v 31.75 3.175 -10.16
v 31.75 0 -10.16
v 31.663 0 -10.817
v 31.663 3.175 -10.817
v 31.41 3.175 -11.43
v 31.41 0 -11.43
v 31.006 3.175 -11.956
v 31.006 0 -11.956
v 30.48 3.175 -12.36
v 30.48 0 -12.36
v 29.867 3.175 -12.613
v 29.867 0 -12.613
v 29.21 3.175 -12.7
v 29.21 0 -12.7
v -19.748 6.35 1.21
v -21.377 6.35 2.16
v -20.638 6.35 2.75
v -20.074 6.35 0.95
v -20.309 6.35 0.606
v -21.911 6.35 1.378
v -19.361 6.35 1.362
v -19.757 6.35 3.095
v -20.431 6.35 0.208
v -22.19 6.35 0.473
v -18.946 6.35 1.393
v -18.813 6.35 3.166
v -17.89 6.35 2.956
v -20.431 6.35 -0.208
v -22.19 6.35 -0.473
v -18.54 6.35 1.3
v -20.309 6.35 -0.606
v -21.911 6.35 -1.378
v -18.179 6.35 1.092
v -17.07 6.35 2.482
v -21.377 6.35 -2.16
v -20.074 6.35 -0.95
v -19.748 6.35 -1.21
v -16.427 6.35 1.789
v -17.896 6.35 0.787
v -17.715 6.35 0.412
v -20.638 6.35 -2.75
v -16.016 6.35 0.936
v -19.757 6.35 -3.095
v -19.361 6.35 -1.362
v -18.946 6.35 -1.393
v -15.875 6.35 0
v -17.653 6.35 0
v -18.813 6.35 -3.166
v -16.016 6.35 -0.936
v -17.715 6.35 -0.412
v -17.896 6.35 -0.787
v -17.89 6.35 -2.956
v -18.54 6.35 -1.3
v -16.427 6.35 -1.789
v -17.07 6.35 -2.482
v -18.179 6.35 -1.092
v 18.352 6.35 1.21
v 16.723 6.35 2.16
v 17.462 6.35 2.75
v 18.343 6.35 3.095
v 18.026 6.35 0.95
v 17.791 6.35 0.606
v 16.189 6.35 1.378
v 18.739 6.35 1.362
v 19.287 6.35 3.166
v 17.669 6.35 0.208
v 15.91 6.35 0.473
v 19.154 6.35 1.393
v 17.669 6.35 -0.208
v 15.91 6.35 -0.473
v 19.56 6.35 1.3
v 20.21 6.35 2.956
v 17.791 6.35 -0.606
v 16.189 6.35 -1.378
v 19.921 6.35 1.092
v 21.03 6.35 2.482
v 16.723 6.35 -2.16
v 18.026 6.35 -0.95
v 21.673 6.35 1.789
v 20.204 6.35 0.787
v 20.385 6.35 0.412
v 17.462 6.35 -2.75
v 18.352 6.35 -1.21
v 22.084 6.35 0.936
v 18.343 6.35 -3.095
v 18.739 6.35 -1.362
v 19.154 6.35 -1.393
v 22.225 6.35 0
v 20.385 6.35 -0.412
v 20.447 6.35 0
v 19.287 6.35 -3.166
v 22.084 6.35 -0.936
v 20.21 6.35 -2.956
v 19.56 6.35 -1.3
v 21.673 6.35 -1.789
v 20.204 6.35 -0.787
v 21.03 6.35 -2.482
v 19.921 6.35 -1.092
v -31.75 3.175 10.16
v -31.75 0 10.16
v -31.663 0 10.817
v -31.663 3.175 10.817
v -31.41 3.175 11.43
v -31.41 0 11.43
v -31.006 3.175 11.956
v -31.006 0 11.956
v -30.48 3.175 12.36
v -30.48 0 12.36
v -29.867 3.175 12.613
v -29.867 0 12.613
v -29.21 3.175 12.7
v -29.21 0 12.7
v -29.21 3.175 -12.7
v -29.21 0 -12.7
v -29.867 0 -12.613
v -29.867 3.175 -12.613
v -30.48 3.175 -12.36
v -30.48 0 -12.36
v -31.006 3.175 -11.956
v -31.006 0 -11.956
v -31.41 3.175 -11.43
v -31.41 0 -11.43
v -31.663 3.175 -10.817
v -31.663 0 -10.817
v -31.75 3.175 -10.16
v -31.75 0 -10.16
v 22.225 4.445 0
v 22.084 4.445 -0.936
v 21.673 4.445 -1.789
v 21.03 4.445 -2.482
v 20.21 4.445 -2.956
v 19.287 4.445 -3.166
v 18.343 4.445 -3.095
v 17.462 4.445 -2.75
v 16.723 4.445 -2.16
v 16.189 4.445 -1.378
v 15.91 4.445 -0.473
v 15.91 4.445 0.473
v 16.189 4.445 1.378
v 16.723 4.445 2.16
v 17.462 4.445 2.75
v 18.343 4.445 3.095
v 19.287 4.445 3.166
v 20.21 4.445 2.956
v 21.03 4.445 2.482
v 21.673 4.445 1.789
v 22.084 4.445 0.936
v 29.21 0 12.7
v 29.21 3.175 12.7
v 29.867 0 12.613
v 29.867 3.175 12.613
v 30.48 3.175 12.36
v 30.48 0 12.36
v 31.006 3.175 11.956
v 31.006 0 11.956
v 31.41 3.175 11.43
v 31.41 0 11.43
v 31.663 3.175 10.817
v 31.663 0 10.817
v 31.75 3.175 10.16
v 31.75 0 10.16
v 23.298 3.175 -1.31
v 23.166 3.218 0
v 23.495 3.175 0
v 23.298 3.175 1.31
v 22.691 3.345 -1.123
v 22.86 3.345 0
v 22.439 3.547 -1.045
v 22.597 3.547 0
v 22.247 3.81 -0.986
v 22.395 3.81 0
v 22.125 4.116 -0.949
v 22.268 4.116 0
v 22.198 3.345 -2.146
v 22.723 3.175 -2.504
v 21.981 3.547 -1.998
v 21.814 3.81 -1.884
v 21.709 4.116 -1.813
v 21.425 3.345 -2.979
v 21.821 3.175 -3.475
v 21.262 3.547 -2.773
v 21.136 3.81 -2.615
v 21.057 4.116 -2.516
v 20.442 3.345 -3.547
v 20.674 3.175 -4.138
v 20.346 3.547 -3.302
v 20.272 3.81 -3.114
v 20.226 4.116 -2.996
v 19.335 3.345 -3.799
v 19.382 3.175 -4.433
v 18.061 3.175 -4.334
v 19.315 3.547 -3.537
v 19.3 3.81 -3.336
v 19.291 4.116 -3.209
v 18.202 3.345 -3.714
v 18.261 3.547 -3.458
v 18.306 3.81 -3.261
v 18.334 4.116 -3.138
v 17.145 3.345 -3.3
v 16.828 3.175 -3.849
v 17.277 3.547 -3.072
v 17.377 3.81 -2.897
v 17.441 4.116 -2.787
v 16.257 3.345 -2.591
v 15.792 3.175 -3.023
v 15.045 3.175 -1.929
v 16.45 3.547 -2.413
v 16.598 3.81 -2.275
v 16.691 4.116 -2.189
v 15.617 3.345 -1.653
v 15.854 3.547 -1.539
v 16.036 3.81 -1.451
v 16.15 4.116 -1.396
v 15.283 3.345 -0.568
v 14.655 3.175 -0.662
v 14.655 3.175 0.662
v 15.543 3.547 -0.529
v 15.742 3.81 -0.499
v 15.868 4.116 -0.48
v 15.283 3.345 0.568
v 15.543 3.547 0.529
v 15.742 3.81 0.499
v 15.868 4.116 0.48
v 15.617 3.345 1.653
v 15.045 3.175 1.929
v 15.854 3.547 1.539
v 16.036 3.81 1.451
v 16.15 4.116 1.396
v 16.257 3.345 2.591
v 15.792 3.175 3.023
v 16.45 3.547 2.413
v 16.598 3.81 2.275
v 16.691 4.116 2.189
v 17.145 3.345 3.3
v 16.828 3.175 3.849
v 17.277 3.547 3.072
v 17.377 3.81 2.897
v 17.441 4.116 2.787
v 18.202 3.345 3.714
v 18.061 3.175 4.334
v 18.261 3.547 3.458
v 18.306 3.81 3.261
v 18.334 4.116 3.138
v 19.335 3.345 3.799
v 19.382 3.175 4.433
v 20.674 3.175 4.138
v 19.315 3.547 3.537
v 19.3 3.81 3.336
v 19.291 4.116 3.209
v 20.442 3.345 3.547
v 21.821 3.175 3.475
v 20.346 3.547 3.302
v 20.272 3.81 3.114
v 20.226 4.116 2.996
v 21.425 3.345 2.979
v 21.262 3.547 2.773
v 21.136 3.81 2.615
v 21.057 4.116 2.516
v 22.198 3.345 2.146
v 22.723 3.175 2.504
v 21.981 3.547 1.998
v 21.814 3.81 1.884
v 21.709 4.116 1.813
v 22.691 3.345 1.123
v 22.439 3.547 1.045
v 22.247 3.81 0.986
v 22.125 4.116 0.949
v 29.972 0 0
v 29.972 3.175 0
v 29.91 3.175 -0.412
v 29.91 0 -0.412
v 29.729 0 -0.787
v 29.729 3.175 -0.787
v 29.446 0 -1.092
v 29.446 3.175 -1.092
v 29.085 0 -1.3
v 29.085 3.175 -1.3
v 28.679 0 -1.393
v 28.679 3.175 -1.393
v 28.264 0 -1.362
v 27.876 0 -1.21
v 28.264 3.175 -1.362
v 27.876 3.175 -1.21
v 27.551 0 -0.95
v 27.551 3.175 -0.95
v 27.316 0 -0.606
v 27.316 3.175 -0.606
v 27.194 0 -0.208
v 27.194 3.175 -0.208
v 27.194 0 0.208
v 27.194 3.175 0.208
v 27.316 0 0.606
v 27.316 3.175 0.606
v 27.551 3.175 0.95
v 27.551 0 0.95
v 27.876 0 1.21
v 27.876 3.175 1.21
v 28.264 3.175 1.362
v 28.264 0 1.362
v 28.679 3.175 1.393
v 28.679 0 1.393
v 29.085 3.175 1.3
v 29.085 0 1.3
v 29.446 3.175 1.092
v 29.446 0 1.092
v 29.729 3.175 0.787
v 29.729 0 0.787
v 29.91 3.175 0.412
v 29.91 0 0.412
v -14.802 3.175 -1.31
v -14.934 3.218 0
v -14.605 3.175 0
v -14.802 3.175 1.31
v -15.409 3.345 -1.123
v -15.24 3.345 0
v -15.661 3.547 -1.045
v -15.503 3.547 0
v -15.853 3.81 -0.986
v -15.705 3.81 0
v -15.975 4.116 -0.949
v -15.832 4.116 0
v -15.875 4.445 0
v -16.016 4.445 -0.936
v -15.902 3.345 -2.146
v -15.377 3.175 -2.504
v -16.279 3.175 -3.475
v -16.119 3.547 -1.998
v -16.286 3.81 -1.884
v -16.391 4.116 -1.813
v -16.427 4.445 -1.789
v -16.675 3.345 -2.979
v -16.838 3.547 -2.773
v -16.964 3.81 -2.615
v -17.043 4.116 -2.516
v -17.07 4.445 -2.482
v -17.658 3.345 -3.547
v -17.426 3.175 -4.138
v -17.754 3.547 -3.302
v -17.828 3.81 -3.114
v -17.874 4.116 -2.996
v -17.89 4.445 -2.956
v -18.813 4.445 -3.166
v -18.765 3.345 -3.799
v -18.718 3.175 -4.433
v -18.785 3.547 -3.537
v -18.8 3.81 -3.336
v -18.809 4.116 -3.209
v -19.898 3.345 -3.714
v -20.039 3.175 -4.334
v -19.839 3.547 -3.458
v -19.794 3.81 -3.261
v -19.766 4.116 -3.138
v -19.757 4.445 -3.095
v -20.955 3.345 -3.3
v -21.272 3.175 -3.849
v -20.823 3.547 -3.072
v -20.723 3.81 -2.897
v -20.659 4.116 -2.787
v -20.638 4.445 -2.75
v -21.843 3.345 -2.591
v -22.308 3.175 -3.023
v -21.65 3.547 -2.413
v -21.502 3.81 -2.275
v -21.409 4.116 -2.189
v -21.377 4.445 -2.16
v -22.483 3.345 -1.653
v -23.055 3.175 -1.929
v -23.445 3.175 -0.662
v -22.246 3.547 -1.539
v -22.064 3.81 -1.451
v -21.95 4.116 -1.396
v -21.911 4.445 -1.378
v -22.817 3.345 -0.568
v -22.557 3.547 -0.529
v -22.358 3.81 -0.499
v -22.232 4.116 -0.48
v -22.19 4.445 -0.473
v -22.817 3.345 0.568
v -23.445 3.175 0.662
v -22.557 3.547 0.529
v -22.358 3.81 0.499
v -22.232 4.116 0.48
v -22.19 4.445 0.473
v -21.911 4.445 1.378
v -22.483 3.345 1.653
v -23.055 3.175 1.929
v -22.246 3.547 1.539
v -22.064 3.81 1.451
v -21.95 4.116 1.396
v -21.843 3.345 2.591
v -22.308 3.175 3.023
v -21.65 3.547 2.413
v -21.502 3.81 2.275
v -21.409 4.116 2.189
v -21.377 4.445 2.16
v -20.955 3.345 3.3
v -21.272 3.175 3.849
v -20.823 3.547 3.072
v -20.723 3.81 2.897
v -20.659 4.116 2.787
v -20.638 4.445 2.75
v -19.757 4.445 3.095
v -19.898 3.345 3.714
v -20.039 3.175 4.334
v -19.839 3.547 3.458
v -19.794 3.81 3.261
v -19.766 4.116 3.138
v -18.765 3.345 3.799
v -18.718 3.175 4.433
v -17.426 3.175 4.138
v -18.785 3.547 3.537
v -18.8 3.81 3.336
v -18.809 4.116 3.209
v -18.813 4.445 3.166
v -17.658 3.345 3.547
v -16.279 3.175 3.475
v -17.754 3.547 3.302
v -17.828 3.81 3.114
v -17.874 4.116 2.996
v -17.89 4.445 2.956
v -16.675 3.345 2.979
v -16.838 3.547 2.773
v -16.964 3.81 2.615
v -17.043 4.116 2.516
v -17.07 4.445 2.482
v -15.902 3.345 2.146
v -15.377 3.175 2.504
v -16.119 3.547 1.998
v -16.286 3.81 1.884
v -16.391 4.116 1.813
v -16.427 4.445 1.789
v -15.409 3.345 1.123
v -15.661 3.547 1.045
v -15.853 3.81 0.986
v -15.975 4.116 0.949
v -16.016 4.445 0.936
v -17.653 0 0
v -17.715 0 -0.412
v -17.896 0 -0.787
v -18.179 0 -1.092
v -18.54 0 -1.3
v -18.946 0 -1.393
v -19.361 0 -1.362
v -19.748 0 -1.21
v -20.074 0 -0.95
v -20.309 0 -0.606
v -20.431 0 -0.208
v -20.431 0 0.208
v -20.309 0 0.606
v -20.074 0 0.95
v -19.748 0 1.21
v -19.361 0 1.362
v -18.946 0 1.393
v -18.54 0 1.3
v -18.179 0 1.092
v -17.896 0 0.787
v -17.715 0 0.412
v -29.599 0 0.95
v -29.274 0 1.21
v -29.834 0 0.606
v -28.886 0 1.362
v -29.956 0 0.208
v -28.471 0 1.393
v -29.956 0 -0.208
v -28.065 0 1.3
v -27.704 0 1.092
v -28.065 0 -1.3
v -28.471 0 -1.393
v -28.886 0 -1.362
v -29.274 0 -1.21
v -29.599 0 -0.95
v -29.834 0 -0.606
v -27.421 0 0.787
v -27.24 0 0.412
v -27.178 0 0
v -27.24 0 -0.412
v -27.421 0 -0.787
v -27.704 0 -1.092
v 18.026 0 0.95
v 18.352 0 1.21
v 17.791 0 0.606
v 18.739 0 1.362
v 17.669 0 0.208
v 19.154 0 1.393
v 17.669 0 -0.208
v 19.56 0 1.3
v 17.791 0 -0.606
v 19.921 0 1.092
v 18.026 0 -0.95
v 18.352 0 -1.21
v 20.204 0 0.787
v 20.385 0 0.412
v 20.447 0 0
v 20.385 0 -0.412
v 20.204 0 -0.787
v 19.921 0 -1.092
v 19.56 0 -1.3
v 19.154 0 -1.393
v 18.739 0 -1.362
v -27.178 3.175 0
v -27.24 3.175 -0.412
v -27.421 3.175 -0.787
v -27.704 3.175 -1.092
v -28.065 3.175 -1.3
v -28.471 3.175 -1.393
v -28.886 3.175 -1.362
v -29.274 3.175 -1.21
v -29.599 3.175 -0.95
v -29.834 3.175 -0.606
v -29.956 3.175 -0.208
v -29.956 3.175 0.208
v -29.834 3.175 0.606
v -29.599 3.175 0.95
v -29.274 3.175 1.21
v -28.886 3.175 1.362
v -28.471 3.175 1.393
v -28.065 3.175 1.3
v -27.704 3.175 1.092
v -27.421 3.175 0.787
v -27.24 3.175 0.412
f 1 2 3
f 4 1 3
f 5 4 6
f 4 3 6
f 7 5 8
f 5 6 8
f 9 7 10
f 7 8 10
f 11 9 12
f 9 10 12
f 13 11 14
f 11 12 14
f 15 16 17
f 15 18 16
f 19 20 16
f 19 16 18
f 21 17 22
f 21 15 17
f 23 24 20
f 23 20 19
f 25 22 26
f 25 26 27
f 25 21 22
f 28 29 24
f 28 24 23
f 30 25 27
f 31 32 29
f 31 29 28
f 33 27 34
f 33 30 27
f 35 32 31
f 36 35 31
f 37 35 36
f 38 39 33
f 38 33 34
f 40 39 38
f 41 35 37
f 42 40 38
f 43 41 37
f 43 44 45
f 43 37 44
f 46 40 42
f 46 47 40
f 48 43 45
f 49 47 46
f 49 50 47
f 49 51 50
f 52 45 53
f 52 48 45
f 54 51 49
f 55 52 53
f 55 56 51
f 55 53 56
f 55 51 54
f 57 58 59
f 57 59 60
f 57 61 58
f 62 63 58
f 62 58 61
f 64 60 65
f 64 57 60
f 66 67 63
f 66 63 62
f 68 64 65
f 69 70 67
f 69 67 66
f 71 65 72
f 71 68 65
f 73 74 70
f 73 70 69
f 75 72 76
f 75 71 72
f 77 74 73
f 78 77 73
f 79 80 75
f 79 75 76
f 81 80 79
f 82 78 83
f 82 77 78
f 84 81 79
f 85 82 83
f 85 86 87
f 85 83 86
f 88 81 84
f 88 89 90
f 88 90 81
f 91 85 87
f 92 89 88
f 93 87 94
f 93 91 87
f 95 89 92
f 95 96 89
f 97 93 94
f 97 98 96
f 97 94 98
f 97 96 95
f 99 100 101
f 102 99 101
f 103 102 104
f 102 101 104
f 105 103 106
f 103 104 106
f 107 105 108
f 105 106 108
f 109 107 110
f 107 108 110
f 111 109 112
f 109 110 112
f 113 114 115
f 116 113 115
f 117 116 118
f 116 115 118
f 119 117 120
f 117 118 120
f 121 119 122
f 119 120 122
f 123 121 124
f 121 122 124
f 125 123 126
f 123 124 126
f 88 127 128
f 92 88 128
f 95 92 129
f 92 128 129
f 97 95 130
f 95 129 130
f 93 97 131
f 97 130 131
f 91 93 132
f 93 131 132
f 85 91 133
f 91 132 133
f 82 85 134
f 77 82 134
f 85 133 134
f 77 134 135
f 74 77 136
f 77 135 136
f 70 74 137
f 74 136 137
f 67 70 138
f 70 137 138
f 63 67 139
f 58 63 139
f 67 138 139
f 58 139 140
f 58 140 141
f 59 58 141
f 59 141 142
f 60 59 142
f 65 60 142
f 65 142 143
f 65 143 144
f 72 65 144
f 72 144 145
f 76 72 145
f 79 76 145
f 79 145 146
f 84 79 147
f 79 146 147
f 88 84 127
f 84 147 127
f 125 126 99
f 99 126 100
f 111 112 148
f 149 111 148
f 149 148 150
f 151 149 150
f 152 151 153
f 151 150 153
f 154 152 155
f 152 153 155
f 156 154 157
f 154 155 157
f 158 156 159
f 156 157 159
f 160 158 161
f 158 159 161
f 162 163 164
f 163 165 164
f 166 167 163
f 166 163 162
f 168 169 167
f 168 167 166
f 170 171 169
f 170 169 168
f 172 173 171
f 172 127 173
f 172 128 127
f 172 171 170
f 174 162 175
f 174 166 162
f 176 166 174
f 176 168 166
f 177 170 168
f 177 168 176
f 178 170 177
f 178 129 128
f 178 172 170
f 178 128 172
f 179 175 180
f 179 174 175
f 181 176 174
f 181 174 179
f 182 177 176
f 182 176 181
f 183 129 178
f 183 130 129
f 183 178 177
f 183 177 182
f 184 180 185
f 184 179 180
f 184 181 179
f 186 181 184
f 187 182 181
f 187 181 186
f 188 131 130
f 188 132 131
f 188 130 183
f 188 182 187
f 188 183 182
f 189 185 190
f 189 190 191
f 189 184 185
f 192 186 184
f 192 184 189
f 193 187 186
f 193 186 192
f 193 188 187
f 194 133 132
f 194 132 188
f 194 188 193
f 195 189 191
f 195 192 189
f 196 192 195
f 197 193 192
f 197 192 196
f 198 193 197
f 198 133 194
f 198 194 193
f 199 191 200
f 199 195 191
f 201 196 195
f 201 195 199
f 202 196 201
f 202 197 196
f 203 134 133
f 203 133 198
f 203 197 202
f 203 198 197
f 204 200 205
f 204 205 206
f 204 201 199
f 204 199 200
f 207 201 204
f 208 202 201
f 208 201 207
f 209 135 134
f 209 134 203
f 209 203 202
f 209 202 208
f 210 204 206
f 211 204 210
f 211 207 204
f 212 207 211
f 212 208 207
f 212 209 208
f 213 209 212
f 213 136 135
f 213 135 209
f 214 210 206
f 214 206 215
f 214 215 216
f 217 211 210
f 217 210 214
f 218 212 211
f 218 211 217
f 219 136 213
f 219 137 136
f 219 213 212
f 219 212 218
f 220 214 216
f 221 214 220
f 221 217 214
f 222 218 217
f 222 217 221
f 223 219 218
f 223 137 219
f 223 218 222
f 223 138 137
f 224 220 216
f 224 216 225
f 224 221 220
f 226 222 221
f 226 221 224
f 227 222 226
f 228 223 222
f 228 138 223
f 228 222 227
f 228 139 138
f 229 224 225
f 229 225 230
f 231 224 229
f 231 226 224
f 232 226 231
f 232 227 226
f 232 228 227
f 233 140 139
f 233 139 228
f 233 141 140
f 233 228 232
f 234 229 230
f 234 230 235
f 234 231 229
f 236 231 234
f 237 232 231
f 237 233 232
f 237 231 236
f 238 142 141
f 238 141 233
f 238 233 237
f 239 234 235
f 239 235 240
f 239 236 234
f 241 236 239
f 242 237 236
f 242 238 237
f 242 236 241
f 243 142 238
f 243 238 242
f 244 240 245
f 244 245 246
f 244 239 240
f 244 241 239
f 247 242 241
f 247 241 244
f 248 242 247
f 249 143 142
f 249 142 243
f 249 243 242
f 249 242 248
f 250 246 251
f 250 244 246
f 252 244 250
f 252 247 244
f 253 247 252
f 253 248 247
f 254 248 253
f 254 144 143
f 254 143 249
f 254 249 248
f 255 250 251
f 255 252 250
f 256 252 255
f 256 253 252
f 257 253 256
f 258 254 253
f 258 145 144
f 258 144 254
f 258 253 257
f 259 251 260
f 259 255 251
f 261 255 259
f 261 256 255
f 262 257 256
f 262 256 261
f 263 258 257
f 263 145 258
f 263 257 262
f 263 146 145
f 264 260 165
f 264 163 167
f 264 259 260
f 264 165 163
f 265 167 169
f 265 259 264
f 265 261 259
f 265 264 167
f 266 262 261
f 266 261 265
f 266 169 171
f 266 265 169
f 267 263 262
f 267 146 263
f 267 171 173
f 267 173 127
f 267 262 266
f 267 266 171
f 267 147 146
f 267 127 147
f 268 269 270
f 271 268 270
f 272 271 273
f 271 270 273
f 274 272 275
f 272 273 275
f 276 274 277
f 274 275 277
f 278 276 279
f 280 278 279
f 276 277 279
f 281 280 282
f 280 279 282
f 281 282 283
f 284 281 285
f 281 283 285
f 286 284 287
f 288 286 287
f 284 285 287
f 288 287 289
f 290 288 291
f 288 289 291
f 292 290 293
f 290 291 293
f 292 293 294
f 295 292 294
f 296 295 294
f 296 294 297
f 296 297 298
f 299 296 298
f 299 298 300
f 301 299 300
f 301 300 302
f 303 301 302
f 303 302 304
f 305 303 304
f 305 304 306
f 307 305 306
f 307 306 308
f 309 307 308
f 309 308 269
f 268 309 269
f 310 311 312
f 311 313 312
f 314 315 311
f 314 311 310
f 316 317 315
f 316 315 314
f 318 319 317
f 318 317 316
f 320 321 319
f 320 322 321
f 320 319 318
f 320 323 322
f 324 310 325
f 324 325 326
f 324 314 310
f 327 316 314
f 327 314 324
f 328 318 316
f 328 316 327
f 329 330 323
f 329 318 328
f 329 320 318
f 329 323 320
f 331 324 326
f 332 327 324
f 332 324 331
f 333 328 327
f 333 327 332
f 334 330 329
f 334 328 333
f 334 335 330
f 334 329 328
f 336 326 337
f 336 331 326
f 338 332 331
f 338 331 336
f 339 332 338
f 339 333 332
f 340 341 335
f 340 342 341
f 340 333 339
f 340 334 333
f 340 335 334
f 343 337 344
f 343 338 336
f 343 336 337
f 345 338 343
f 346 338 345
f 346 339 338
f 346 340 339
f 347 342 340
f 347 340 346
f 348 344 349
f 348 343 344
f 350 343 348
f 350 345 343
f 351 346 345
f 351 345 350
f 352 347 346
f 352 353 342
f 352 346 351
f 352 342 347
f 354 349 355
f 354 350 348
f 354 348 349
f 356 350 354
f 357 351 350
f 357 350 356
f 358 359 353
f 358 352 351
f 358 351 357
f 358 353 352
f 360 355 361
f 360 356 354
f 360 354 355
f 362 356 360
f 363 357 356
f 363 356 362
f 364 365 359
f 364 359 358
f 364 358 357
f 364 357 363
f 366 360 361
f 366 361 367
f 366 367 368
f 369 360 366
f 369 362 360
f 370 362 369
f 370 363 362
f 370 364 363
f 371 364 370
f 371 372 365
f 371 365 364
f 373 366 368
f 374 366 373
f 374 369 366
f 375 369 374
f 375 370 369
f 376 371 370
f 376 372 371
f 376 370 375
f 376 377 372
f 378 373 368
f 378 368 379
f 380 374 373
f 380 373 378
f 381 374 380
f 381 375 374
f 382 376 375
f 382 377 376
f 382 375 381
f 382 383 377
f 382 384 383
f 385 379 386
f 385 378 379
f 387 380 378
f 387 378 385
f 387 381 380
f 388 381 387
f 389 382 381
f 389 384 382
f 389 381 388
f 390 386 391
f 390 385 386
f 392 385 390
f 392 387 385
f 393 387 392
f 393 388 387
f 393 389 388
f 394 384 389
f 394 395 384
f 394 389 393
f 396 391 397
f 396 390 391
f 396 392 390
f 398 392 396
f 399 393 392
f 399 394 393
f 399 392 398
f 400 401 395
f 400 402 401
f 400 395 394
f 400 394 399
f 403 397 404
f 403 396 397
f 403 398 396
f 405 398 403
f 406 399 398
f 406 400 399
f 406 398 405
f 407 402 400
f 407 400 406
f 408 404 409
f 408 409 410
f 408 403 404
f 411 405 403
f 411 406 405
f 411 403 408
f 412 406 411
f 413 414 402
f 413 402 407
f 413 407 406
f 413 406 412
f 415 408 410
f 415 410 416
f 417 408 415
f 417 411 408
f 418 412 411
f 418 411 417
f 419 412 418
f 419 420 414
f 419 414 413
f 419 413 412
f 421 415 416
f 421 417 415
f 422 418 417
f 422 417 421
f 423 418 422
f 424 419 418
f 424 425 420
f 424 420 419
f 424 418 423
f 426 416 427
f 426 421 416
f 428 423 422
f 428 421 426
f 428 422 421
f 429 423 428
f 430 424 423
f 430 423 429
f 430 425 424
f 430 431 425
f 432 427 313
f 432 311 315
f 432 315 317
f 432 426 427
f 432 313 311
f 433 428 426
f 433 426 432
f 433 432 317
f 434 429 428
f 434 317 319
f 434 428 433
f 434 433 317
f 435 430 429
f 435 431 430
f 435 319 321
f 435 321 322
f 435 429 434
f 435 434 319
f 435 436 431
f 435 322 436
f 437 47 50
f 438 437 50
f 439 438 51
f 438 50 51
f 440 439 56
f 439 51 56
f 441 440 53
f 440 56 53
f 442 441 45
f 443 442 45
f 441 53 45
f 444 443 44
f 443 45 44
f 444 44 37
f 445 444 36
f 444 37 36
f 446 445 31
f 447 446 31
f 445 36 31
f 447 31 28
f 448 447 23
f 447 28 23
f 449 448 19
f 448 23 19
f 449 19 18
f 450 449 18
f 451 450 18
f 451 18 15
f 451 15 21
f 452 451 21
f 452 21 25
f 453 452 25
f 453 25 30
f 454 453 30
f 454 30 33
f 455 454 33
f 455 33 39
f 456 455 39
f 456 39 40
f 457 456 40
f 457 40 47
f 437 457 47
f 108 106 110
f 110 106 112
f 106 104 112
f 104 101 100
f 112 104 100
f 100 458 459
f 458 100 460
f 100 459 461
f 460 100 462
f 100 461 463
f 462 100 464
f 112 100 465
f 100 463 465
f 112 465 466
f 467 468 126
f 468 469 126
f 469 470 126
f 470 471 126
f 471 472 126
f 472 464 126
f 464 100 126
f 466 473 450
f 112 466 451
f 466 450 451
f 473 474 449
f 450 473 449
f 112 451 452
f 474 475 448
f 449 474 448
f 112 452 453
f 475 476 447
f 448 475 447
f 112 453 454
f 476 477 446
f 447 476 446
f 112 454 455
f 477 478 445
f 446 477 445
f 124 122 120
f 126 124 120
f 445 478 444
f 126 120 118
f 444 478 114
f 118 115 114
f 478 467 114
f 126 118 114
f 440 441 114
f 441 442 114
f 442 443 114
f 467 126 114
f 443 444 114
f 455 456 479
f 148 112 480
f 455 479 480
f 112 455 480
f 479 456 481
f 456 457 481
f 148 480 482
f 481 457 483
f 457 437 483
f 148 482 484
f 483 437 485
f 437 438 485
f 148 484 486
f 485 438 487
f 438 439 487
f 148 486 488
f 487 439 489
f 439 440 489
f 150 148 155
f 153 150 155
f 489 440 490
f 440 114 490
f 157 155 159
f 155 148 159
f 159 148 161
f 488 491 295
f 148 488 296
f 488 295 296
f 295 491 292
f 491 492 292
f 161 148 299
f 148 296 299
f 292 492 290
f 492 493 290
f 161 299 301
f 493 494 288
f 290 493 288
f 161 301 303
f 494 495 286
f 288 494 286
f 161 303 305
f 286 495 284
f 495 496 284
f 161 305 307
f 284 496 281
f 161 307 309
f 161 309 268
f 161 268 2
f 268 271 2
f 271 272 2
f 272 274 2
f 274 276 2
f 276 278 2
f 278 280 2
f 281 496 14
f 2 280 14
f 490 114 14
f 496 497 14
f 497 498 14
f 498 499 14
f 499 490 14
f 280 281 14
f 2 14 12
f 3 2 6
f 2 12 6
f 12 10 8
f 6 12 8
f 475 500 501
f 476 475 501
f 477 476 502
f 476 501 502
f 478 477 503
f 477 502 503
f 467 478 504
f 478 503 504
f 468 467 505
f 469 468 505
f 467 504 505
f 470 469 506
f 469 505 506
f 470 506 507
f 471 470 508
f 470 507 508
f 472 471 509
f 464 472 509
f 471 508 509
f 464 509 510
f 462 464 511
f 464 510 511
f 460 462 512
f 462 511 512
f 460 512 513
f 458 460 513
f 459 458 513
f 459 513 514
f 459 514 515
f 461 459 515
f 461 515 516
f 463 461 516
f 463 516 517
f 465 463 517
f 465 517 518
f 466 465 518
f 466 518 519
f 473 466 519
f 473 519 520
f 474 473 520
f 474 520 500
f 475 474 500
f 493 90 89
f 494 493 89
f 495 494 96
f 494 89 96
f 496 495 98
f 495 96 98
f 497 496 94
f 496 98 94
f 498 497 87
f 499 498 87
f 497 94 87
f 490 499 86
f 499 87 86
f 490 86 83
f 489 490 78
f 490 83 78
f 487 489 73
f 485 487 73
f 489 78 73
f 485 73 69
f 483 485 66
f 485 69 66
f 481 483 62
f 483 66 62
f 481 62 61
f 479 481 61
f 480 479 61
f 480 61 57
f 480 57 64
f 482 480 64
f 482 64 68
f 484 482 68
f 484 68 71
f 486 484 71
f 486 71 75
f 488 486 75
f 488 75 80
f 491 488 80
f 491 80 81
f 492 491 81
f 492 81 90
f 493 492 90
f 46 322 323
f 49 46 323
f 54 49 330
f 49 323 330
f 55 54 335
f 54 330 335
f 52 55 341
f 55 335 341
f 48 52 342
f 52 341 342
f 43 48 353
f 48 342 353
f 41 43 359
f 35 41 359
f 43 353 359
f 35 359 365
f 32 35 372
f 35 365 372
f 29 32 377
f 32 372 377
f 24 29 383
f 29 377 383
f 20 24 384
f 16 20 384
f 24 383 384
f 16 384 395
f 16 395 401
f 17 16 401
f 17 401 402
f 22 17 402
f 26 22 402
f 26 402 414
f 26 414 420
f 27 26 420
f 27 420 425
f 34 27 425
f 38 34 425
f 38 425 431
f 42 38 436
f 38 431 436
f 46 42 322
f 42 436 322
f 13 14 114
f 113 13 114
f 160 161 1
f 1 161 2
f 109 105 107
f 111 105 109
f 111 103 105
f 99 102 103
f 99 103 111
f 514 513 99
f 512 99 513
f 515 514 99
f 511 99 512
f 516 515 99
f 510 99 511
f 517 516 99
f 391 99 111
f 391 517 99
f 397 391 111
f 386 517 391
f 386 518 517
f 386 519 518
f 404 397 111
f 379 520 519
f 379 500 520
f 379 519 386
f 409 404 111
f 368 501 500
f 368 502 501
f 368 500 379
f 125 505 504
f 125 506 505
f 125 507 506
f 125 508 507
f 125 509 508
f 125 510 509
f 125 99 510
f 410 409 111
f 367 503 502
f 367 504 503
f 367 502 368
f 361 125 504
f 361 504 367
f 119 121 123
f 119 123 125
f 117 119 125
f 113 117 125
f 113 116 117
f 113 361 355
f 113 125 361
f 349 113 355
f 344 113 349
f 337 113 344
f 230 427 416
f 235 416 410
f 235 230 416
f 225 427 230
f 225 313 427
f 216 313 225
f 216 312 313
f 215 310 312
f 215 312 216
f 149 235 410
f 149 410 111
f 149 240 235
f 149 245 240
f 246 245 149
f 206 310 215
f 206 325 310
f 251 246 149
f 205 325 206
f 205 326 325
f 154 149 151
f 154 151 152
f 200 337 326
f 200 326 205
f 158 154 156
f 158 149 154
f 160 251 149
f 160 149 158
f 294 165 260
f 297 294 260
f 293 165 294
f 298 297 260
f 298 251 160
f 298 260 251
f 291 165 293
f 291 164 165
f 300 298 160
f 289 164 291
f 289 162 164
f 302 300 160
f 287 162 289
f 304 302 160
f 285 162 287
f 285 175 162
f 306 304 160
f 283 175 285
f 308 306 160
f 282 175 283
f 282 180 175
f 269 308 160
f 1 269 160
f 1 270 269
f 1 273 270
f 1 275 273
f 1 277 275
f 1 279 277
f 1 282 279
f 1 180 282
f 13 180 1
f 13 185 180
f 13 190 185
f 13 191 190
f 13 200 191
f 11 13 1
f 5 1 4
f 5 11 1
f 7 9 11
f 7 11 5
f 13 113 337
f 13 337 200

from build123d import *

# Parameters (mm, degrees)
BOSS_EXTRUDE1_DEPTH = 3.175
SKETCH2_R           = 3.175
BOSS_EXTRUDE2_DEPTH = 3.175
SKETCH3_R           = 1.397
CUT_EXTRUDE1_DEPTH  = 7.35
FILLET1_R           = 1.27
CUT_EXTRUDE2_REACH  = 5.175
SKETCH4_R           = 1.397


with BuildPart() as part:
    # Sketch1 → Boss-Extrude1 (new body)
    with BuildSketch(Plane(origin=(0, 0, 0), x_dir=(1, 0, 0), z_dir=(0, 1, 0))):
        with BuildLine():
            Line((-29.21, -12.7), (29.21, -12.7))
            ThreePointArc((29.21, -12.7), (31.006051224, -11.956051224), (31.75, -10.16))
            Line((31.75, -10.16), (31.75, 10.16))
            ThreePointArc((31.75, 10.16), (31.006051224, 11.956051224), (29.21, 12.7))
            Line((29.21, 12.7), (-29.21, 12.7))
            ThreePointArc((-29.21, 12.7), (-31.006051224, 11.956051224), (-31.75, 10.16))
            Line((-31.75, 10.16), (-31.75, -10.16))
            ThreePointArc((-31.75, -10.16), (-31.006051224, -11.956051224), (-29.21, -12.7))
        make_face()
    extrude(amount=BOSS_EXTRUDE1_DEPTH)

    # Sketch2 → Boss-Extrude2 (add)
    with BuildSketch(Plane(origin=(0, 3.175, 0), x_dir=(1, 0, 0), z_dir=(0, 1, 0))):
        with Locations((-19.05, 0)):
            Circle(SKETCH2_R)
        with Locations((19.05, 0)):
            Circle(SKETCH2_R)
    extrude(amount=BOSS_EXTRUDE2_DEPTH)

    # Sketch3 → Cut-Extrude1 (cut, through all)
    with BuildSketch(Plane(origin=(0, 6.35, 0), x_dir=(1, 0, 0), z_dir=(0, 1, 0))):
        with Locations((-19.05, 0)):
            Circle(SKETCH3_R)
        with Locations((19.05, 0)):
            Circle(SKETCH3_R)
    extrude(amount=-CUT_EXTRUDE1_DEPTH, mode=Mode.SUBTRACT)

    # Fillet1
    fillet1_edges = [part.edges().sort_by_distance(p)[0] for p in [
        (-22.225, 3.175, 0),
        (15.875, 3.175, 0),
    ]]
    fillet(fillet1_edges, radius=FILLET1_R)

    # Sketch4 → Cut-Extrude2 (cut, up to next)
    with BuildSketch(Plane(origin=(0, 3.175, 0), x_dir=(1, 0, 0), z_dir=(0, 1, 0)), mode=Mode.PRIVATE) as cut_extrude2_sk1:
        with Locations((-28.575, 0)):
            Circle(SKETCH4_R)
    cut_extrude2_tool1 = extrude(cut_extrude2_sk1.sketch, amount=-CUT_EXTRUDE2_REACH, mode=Mode.PRIVATE) & part.part
    add(cut_extrude2_tool1.solids().sort_by_distance((-28.575, 3.175, 0))[0], mode=Mode.SUBTRACT)
    # Sketch4 → Cut-Extrude2 (cut, up to next)
    with BuildSketch(Plane(origin=(0, 3.175, 0), x_dir=(1, 0, 0), z_dir=(0, 1, 0)), mode=Mode.PRIVATE) as cut_extrude2_sk2:
        with Locations((28.575, 0)):
            Circle(SKETCH4_R)
    cut_extrude2_tool2 = extrude(cut_extrude2_sk2.sketch, amount=-CUT_EXTRUDE2_REACH, mode=Mode.PRIVATE) & part.part
    add(cut_extrude2_tool2.solids().sort_by_distance((28.575, 3.175, 0))[0], mode=Mode.SUBTRACT)


solid = part.part
